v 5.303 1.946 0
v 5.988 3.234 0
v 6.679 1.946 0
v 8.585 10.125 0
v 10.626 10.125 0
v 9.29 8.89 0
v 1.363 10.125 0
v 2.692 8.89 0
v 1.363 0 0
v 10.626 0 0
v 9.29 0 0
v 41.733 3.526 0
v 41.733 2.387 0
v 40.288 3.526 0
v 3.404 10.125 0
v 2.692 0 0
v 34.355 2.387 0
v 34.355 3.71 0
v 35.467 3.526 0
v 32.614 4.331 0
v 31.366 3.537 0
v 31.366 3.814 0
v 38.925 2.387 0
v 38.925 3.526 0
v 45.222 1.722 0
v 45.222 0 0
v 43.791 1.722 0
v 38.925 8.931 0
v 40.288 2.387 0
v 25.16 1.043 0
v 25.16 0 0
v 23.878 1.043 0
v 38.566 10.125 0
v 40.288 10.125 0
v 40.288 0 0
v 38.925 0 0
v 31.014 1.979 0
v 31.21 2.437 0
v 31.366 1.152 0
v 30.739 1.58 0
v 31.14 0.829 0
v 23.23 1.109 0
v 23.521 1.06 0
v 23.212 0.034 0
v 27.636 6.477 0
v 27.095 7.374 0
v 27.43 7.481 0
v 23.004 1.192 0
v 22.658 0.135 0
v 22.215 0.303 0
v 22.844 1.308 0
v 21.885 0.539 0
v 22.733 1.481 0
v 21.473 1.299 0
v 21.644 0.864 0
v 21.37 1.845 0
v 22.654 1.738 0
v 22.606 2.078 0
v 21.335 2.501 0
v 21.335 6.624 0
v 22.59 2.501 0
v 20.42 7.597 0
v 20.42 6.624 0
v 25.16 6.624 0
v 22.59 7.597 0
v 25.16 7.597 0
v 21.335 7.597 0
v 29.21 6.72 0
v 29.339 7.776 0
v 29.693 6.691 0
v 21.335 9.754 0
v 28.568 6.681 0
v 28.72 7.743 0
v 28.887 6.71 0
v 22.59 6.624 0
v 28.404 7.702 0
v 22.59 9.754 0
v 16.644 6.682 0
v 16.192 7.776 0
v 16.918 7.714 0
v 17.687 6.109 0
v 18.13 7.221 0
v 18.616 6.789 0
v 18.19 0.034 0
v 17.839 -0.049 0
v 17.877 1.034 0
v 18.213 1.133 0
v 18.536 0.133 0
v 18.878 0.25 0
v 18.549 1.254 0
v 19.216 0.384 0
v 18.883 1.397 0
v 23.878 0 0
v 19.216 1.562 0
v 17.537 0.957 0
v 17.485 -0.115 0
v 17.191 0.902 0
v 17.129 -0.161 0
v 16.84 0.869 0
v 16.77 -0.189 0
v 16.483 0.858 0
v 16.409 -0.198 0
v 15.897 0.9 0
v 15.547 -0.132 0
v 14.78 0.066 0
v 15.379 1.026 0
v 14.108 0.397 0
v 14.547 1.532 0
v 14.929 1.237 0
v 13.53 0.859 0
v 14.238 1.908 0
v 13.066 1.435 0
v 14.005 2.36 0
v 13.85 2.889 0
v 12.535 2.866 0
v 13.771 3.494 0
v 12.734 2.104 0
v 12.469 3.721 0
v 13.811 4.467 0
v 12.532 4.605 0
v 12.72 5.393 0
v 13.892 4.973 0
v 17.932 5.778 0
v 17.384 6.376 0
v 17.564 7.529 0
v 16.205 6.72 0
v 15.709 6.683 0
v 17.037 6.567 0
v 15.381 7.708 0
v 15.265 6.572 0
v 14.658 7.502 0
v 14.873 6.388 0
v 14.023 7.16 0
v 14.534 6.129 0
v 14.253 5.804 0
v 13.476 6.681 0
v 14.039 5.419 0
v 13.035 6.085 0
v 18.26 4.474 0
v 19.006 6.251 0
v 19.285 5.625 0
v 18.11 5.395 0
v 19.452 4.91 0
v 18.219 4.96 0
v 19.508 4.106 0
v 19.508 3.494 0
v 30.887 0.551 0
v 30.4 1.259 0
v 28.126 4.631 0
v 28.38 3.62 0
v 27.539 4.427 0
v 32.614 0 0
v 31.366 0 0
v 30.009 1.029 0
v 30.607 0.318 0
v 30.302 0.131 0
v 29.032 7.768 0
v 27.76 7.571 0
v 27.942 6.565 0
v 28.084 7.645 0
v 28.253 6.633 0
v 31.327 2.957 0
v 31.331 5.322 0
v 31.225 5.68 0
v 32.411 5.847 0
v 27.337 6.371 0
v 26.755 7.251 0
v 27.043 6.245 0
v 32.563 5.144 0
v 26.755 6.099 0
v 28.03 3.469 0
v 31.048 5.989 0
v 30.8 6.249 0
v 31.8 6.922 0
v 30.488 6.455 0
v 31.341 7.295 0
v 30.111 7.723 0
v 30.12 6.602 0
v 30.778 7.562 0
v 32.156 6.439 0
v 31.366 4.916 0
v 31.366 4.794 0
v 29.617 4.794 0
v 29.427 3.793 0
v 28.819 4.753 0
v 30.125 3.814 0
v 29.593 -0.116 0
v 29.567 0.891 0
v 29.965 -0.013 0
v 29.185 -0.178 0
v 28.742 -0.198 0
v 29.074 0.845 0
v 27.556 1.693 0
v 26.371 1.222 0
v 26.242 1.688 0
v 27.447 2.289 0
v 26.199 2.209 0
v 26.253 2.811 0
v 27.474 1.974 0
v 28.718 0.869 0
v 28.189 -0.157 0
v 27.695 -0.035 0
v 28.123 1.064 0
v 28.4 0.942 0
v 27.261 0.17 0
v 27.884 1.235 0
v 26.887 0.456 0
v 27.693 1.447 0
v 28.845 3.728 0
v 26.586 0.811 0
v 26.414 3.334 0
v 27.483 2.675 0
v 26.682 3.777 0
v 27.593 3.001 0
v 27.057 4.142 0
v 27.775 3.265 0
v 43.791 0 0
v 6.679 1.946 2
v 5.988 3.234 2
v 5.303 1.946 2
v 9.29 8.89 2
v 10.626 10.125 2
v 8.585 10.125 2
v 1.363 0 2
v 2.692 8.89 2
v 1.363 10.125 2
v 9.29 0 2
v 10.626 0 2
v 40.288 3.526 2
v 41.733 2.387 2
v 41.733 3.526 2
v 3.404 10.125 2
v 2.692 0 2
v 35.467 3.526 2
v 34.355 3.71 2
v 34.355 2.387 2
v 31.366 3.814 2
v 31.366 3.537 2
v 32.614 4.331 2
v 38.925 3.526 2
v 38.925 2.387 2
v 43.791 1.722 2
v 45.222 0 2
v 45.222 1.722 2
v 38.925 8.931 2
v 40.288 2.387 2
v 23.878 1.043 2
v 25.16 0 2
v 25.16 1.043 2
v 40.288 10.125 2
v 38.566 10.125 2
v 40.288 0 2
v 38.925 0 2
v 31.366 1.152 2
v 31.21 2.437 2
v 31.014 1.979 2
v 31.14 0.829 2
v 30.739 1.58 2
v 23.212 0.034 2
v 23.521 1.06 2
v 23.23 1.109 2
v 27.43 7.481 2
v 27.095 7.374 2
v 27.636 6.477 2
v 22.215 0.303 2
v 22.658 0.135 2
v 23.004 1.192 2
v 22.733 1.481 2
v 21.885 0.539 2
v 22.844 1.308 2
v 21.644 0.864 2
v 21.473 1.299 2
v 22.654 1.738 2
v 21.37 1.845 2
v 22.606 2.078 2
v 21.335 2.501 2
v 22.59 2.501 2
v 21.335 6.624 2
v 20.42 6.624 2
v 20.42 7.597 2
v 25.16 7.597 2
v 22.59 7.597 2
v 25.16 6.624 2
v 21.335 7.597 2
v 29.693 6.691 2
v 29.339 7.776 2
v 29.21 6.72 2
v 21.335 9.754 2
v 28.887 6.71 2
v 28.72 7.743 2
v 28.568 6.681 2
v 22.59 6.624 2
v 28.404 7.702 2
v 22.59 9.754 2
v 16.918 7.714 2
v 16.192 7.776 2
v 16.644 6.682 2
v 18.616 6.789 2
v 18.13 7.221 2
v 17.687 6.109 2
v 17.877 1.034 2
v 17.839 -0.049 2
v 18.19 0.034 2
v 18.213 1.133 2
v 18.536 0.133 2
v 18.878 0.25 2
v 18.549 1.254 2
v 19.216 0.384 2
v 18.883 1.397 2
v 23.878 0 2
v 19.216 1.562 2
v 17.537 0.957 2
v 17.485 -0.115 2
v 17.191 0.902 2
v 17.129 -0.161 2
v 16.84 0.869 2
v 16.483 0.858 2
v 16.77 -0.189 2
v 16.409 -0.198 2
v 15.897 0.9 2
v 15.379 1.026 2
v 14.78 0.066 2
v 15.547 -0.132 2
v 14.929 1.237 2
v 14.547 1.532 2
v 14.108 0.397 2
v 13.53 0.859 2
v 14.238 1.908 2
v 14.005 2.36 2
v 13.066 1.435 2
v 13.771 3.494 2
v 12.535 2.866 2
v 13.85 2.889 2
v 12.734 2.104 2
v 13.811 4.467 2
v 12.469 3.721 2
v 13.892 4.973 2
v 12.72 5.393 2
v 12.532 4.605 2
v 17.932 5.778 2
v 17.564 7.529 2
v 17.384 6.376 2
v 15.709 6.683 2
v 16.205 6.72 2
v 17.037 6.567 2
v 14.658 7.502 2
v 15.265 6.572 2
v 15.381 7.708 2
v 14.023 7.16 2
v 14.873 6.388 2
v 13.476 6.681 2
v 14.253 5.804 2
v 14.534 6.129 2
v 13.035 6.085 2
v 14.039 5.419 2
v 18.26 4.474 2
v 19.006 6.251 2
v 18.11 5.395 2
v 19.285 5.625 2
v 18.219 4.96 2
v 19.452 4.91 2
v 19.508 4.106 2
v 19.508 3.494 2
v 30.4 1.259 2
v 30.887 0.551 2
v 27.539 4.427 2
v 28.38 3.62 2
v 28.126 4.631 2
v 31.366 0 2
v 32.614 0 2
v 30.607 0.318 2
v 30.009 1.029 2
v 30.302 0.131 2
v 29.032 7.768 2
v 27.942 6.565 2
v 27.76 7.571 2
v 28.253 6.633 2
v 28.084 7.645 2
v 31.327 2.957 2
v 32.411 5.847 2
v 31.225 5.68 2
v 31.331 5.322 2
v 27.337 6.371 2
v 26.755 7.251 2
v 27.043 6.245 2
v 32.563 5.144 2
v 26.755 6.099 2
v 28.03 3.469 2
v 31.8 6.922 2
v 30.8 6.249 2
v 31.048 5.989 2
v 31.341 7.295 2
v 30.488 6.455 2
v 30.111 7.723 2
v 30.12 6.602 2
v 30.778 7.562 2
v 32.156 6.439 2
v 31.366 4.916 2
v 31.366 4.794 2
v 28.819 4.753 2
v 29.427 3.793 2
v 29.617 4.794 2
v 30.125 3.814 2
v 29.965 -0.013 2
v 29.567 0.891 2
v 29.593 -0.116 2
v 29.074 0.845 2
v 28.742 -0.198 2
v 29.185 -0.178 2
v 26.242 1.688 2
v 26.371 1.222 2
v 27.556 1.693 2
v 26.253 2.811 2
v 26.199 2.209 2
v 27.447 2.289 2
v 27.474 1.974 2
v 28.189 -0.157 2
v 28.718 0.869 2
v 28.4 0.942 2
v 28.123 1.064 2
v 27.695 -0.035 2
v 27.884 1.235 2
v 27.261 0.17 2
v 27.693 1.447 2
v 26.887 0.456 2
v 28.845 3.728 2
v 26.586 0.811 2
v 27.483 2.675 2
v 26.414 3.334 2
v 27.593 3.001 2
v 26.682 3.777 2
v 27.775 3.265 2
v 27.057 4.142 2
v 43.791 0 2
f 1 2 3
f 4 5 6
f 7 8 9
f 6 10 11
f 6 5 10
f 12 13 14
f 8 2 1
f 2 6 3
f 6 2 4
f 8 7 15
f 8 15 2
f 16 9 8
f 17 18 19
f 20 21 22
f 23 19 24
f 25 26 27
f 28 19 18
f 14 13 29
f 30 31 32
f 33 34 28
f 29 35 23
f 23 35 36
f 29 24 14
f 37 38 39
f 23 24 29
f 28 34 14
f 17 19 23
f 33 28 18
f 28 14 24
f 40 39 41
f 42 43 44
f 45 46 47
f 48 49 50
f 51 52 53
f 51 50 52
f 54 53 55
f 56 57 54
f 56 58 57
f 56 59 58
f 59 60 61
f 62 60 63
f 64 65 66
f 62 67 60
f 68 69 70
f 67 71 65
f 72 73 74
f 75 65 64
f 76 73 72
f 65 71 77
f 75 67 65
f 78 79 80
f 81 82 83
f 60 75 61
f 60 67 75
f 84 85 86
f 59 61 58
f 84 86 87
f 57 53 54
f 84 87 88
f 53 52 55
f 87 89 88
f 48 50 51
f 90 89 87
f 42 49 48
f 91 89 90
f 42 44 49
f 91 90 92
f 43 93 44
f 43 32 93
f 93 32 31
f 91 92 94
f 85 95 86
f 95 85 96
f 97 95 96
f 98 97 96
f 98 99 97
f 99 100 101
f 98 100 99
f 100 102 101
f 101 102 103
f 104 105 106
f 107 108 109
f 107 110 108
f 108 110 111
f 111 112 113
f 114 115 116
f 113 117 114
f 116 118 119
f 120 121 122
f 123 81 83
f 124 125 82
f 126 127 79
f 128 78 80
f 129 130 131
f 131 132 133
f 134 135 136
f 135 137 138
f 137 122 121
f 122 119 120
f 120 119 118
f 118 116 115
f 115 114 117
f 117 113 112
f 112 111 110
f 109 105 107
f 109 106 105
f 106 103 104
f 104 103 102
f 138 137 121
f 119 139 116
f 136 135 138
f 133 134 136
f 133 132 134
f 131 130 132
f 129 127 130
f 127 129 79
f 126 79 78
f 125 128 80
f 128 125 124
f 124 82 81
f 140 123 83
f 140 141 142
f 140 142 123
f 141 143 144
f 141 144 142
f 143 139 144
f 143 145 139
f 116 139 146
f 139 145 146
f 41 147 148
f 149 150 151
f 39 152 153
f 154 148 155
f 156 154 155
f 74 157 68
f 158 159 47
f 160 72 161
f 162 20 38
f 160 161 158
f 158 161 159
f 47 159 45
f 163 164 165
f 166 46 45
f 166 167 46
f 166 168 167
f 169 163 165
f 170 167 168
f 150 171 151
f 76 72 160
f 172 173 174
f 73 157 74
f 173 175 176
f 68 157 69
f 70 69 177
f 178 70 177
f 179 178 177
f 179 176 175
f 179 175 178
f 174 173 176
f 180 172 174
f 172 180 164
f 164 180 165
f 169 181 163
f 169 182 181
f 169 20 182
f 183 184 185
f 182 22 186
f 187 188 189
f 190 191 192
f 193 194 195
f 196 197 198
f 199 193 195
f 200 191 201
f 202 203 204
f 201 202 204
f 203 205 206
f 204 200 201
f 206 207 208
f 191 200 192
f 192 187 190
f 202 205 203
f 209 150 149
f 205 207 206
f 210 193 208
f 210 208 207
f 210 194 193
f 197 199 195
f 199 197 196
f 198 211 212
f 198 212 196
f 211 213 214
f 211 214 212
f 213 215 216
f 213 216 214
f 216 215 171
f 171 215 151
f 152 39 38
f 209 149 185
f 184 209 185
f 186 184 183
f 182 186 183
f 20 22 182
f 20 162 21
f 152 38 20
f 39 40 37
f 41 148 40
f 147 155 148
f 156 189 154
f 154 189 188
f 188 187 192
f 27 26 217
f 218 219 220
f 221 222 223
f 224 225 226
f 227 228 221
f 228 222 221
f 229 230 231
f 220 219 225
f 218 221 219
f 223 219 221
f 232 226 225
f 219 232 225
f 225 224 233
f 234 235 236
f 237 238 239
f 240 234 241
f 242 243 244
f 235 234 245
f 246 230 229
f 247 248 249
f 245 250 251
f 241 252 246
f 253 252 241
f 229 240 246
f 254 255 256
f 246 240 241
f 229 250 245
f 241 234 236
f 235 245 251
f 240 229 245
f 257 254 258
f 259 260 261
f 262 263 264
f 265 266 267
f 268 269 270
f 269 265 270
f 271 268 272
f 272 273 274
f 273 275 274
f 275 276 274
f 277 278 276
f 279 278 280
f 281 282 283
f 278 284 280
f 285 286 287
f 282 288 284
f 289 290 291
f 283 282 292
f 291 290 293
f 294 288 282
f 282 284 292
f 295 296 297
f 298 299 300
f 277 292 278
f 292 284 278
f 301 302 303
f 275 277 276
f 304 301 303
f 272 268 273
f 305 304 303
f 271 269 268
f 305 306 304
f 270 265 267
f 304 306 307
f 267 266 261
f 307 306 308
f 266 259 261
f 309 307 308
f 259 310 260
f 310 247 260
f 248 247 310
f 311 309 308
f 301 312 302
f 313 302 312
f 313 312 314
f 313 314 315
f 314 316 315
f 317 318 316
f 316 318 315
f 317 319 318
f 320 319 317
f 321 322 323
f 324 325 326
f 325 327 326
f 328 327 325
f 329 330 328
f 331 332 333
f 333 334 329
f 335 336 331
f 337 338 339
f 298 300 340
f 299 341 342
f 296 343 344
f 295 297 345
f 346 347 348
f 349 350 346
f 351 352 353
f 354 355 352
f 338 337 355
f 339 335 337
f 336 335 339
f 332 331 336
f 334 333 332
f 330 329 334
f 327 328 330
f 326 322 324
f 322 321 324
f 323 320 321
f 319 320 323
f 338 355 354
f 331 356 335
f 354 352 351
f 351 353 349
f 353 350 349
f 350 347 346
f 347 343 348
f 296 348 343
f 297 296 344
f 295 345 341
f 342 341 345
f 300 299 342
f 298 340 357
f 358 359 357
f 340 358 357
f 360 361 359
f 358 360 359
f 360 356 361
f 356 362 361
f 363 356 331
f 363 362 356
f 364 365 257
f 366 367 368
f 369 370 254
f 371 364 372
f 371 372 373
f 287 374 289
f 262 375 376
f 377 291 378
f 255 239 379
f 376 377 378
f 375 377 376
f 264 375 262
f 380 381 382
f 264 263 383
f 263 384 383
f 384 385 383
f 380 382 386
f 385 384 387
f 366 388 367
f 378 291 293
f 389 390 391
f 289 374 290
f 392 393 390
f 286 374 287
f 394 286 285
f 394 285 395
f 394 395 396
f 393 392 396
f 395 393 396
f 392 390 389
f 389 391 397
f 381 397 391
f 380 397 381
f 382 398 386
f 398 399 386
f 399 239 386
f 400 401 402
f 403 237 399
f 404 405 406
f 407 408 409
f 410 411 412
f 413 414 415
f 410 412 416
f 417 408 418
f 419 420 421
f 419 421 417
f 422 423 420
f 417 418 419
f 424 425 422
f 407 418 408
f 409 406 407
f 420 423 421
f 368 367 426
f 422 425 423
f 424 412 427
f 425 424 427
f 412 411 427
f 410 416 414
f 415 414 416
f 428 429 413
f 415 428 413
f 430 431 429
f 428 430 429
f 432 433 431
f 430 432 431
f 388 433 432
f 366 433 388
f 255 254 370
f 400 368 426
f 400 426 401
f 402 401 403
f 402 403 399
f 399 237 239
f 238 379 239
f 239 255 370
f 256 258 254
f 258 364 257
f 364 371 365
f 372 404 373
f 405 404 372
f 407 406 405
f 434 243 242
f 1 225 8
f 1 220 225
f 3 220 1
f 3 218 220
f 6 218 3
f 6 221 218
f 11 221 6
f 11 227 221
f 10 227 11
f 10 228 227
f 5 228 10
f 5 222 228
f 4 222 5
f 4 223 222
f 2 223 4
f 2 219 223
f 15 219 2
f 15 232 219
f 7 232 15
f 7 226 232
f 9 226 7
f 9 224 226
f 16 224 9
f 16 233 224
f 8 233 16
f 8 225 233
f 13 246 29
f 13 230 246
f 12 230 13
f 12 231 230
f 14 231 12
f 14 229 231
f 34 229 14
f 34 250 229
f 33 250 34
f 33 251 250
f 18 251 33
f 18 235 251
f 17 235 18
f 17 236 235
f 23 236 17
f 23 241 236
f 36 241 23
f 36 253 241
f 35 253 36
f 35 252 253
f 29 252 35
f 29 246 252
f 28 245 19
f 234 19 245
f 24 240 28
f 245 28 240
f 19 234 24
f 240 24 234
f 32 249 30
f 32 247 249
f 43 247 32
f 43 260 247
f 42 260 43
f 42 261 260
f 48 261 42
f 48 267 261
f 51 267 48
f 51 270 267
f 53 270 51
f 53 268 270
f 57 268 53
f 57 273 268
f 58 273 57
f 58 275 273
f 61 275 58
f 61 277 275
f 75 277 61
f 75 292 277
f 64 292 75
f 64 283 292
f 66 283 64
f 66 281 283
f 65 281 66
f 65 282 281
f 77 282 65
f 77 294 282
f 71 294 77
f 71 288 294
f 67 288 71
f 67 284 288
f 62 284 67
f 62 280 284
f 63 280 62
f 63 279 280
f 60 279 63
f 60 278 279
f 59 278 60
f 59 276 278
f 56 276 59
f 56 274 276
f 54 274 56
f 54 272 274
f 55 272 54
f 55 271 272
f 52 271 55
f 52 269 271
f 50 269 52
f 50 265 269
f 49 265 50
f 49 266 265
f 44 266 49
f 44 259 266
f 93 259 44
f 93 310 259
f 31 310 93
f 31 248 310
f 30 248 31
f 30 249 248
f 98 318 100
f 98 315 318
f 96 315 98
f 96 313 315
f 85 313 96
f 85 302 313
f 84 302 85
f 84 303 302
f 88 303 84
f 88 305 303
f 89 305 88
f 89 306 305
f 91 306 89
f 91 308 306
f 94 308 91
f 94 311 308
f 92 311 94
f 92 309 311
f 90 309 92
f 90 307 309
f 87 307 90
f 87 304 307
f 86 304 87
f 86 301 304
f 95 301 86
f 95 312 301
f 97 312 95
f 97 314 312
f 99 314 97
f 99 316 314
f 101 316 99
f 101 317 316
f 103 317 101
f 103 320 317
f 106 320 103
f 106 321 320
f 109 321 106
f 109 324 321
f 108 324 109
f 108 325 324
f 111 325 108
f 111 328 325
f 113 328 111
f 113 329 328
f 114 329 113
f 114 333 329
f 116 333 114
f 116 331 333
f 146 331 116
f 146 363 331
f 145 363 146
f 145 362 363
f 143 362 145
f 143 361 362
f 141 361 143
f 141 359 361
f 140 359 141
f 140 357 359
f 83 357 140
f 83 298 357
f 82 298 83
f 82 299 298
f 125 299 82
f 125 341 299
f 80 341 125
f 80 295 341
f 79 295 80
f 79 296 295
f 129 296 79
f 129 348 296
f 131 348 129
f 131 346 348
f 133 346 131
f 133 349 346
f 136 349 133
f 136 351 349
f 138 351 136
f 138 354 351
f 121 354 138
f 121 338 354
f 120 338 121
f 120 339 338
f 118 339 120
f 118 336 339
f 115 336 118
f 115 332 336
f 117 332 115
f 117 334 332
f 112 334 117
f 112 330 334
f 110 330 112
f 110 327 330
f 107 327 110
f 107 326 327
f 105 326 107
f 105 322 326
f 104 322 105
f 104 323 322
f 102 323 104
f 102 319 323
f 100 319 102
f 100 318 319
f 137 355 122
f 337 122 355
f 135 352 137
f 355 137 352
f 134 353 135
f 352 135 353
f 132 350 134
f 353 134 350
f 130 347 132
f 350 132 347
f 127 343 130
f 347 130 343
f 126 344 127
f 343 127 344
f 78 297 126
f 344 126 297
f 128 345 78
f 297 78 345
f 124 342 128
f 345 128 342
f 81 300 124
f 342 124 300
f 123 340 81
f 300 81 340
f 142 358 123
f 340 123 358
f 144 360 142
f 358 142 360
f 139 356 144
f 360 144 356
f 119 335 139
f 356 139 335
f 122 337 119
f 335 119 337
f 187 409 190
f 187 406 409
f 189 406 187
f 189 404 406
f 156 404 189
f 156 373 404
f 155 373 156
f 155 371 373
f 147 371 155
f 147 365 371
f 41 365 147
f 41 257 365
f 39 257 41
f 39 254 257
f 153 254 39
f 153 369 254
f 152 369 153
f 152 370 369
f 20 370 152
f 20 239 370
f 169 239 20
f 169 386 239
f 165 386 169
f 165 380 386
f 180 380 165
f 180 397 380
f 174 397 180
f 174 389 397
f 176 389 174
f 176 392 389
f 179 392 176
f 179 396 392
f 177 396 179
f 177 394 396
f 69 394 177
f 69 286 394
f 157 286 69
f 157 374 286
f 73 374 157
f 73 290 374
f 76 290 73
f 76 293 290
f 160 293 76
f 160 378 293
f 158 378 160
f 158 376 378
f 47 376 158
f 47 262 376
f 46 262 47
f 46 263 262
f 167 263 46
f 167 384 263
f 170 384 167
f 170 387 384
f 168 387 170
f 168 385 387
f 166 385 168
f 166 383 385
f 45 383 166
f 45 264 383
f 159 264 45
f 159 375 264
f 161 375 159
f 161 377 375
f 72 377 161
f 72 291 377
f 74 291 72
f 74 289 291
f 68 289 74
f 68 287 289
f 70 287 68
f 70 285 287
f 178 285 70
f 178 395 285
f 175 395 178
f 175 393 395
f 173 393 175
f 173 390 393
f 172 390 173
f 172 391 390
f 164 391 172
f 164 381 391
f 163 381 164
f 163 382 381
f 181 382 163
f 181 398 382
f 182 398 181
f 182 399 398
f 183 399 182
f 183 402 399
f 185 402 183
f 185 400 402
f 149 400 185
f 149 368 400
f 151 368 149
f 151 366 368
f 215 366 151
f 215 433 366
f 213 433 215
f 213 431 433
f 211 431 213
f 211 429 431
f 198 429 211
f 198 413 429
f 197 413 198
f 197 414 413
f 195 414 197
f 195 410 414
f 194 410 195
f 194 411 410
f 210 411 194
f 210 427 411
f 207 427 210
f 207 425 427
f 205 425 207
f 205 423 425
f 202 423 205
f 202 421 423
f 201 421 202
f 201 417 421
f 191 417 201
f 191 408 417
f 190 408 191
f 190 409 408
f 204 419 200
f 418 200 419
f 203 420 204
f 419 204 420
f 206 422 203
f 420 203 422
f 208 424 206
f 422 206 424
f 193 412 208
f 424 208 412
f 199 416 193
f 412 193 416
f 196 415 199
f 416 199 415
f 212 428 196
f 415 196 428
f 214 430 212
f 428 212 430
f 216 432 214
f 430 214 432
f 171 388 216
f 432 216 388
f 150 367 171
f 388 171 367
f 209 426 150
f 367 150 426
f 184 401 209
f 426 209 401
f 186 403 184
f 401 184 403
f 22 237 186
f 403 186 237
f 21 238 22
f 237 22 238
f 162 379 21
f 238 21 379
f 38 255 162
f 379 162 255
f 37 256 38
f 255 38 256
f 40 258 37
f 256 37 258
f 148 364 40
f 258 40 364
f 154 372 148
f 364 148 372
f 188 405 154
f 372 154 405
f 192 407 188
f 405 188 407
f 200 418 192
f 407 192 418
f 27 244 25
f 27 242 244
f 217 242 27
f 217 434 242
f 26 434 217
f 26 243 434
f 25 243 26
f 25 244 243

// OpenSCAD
linear_extrude(height=2) {
    
text("Meta4.", font="Lato Semibold");
}
